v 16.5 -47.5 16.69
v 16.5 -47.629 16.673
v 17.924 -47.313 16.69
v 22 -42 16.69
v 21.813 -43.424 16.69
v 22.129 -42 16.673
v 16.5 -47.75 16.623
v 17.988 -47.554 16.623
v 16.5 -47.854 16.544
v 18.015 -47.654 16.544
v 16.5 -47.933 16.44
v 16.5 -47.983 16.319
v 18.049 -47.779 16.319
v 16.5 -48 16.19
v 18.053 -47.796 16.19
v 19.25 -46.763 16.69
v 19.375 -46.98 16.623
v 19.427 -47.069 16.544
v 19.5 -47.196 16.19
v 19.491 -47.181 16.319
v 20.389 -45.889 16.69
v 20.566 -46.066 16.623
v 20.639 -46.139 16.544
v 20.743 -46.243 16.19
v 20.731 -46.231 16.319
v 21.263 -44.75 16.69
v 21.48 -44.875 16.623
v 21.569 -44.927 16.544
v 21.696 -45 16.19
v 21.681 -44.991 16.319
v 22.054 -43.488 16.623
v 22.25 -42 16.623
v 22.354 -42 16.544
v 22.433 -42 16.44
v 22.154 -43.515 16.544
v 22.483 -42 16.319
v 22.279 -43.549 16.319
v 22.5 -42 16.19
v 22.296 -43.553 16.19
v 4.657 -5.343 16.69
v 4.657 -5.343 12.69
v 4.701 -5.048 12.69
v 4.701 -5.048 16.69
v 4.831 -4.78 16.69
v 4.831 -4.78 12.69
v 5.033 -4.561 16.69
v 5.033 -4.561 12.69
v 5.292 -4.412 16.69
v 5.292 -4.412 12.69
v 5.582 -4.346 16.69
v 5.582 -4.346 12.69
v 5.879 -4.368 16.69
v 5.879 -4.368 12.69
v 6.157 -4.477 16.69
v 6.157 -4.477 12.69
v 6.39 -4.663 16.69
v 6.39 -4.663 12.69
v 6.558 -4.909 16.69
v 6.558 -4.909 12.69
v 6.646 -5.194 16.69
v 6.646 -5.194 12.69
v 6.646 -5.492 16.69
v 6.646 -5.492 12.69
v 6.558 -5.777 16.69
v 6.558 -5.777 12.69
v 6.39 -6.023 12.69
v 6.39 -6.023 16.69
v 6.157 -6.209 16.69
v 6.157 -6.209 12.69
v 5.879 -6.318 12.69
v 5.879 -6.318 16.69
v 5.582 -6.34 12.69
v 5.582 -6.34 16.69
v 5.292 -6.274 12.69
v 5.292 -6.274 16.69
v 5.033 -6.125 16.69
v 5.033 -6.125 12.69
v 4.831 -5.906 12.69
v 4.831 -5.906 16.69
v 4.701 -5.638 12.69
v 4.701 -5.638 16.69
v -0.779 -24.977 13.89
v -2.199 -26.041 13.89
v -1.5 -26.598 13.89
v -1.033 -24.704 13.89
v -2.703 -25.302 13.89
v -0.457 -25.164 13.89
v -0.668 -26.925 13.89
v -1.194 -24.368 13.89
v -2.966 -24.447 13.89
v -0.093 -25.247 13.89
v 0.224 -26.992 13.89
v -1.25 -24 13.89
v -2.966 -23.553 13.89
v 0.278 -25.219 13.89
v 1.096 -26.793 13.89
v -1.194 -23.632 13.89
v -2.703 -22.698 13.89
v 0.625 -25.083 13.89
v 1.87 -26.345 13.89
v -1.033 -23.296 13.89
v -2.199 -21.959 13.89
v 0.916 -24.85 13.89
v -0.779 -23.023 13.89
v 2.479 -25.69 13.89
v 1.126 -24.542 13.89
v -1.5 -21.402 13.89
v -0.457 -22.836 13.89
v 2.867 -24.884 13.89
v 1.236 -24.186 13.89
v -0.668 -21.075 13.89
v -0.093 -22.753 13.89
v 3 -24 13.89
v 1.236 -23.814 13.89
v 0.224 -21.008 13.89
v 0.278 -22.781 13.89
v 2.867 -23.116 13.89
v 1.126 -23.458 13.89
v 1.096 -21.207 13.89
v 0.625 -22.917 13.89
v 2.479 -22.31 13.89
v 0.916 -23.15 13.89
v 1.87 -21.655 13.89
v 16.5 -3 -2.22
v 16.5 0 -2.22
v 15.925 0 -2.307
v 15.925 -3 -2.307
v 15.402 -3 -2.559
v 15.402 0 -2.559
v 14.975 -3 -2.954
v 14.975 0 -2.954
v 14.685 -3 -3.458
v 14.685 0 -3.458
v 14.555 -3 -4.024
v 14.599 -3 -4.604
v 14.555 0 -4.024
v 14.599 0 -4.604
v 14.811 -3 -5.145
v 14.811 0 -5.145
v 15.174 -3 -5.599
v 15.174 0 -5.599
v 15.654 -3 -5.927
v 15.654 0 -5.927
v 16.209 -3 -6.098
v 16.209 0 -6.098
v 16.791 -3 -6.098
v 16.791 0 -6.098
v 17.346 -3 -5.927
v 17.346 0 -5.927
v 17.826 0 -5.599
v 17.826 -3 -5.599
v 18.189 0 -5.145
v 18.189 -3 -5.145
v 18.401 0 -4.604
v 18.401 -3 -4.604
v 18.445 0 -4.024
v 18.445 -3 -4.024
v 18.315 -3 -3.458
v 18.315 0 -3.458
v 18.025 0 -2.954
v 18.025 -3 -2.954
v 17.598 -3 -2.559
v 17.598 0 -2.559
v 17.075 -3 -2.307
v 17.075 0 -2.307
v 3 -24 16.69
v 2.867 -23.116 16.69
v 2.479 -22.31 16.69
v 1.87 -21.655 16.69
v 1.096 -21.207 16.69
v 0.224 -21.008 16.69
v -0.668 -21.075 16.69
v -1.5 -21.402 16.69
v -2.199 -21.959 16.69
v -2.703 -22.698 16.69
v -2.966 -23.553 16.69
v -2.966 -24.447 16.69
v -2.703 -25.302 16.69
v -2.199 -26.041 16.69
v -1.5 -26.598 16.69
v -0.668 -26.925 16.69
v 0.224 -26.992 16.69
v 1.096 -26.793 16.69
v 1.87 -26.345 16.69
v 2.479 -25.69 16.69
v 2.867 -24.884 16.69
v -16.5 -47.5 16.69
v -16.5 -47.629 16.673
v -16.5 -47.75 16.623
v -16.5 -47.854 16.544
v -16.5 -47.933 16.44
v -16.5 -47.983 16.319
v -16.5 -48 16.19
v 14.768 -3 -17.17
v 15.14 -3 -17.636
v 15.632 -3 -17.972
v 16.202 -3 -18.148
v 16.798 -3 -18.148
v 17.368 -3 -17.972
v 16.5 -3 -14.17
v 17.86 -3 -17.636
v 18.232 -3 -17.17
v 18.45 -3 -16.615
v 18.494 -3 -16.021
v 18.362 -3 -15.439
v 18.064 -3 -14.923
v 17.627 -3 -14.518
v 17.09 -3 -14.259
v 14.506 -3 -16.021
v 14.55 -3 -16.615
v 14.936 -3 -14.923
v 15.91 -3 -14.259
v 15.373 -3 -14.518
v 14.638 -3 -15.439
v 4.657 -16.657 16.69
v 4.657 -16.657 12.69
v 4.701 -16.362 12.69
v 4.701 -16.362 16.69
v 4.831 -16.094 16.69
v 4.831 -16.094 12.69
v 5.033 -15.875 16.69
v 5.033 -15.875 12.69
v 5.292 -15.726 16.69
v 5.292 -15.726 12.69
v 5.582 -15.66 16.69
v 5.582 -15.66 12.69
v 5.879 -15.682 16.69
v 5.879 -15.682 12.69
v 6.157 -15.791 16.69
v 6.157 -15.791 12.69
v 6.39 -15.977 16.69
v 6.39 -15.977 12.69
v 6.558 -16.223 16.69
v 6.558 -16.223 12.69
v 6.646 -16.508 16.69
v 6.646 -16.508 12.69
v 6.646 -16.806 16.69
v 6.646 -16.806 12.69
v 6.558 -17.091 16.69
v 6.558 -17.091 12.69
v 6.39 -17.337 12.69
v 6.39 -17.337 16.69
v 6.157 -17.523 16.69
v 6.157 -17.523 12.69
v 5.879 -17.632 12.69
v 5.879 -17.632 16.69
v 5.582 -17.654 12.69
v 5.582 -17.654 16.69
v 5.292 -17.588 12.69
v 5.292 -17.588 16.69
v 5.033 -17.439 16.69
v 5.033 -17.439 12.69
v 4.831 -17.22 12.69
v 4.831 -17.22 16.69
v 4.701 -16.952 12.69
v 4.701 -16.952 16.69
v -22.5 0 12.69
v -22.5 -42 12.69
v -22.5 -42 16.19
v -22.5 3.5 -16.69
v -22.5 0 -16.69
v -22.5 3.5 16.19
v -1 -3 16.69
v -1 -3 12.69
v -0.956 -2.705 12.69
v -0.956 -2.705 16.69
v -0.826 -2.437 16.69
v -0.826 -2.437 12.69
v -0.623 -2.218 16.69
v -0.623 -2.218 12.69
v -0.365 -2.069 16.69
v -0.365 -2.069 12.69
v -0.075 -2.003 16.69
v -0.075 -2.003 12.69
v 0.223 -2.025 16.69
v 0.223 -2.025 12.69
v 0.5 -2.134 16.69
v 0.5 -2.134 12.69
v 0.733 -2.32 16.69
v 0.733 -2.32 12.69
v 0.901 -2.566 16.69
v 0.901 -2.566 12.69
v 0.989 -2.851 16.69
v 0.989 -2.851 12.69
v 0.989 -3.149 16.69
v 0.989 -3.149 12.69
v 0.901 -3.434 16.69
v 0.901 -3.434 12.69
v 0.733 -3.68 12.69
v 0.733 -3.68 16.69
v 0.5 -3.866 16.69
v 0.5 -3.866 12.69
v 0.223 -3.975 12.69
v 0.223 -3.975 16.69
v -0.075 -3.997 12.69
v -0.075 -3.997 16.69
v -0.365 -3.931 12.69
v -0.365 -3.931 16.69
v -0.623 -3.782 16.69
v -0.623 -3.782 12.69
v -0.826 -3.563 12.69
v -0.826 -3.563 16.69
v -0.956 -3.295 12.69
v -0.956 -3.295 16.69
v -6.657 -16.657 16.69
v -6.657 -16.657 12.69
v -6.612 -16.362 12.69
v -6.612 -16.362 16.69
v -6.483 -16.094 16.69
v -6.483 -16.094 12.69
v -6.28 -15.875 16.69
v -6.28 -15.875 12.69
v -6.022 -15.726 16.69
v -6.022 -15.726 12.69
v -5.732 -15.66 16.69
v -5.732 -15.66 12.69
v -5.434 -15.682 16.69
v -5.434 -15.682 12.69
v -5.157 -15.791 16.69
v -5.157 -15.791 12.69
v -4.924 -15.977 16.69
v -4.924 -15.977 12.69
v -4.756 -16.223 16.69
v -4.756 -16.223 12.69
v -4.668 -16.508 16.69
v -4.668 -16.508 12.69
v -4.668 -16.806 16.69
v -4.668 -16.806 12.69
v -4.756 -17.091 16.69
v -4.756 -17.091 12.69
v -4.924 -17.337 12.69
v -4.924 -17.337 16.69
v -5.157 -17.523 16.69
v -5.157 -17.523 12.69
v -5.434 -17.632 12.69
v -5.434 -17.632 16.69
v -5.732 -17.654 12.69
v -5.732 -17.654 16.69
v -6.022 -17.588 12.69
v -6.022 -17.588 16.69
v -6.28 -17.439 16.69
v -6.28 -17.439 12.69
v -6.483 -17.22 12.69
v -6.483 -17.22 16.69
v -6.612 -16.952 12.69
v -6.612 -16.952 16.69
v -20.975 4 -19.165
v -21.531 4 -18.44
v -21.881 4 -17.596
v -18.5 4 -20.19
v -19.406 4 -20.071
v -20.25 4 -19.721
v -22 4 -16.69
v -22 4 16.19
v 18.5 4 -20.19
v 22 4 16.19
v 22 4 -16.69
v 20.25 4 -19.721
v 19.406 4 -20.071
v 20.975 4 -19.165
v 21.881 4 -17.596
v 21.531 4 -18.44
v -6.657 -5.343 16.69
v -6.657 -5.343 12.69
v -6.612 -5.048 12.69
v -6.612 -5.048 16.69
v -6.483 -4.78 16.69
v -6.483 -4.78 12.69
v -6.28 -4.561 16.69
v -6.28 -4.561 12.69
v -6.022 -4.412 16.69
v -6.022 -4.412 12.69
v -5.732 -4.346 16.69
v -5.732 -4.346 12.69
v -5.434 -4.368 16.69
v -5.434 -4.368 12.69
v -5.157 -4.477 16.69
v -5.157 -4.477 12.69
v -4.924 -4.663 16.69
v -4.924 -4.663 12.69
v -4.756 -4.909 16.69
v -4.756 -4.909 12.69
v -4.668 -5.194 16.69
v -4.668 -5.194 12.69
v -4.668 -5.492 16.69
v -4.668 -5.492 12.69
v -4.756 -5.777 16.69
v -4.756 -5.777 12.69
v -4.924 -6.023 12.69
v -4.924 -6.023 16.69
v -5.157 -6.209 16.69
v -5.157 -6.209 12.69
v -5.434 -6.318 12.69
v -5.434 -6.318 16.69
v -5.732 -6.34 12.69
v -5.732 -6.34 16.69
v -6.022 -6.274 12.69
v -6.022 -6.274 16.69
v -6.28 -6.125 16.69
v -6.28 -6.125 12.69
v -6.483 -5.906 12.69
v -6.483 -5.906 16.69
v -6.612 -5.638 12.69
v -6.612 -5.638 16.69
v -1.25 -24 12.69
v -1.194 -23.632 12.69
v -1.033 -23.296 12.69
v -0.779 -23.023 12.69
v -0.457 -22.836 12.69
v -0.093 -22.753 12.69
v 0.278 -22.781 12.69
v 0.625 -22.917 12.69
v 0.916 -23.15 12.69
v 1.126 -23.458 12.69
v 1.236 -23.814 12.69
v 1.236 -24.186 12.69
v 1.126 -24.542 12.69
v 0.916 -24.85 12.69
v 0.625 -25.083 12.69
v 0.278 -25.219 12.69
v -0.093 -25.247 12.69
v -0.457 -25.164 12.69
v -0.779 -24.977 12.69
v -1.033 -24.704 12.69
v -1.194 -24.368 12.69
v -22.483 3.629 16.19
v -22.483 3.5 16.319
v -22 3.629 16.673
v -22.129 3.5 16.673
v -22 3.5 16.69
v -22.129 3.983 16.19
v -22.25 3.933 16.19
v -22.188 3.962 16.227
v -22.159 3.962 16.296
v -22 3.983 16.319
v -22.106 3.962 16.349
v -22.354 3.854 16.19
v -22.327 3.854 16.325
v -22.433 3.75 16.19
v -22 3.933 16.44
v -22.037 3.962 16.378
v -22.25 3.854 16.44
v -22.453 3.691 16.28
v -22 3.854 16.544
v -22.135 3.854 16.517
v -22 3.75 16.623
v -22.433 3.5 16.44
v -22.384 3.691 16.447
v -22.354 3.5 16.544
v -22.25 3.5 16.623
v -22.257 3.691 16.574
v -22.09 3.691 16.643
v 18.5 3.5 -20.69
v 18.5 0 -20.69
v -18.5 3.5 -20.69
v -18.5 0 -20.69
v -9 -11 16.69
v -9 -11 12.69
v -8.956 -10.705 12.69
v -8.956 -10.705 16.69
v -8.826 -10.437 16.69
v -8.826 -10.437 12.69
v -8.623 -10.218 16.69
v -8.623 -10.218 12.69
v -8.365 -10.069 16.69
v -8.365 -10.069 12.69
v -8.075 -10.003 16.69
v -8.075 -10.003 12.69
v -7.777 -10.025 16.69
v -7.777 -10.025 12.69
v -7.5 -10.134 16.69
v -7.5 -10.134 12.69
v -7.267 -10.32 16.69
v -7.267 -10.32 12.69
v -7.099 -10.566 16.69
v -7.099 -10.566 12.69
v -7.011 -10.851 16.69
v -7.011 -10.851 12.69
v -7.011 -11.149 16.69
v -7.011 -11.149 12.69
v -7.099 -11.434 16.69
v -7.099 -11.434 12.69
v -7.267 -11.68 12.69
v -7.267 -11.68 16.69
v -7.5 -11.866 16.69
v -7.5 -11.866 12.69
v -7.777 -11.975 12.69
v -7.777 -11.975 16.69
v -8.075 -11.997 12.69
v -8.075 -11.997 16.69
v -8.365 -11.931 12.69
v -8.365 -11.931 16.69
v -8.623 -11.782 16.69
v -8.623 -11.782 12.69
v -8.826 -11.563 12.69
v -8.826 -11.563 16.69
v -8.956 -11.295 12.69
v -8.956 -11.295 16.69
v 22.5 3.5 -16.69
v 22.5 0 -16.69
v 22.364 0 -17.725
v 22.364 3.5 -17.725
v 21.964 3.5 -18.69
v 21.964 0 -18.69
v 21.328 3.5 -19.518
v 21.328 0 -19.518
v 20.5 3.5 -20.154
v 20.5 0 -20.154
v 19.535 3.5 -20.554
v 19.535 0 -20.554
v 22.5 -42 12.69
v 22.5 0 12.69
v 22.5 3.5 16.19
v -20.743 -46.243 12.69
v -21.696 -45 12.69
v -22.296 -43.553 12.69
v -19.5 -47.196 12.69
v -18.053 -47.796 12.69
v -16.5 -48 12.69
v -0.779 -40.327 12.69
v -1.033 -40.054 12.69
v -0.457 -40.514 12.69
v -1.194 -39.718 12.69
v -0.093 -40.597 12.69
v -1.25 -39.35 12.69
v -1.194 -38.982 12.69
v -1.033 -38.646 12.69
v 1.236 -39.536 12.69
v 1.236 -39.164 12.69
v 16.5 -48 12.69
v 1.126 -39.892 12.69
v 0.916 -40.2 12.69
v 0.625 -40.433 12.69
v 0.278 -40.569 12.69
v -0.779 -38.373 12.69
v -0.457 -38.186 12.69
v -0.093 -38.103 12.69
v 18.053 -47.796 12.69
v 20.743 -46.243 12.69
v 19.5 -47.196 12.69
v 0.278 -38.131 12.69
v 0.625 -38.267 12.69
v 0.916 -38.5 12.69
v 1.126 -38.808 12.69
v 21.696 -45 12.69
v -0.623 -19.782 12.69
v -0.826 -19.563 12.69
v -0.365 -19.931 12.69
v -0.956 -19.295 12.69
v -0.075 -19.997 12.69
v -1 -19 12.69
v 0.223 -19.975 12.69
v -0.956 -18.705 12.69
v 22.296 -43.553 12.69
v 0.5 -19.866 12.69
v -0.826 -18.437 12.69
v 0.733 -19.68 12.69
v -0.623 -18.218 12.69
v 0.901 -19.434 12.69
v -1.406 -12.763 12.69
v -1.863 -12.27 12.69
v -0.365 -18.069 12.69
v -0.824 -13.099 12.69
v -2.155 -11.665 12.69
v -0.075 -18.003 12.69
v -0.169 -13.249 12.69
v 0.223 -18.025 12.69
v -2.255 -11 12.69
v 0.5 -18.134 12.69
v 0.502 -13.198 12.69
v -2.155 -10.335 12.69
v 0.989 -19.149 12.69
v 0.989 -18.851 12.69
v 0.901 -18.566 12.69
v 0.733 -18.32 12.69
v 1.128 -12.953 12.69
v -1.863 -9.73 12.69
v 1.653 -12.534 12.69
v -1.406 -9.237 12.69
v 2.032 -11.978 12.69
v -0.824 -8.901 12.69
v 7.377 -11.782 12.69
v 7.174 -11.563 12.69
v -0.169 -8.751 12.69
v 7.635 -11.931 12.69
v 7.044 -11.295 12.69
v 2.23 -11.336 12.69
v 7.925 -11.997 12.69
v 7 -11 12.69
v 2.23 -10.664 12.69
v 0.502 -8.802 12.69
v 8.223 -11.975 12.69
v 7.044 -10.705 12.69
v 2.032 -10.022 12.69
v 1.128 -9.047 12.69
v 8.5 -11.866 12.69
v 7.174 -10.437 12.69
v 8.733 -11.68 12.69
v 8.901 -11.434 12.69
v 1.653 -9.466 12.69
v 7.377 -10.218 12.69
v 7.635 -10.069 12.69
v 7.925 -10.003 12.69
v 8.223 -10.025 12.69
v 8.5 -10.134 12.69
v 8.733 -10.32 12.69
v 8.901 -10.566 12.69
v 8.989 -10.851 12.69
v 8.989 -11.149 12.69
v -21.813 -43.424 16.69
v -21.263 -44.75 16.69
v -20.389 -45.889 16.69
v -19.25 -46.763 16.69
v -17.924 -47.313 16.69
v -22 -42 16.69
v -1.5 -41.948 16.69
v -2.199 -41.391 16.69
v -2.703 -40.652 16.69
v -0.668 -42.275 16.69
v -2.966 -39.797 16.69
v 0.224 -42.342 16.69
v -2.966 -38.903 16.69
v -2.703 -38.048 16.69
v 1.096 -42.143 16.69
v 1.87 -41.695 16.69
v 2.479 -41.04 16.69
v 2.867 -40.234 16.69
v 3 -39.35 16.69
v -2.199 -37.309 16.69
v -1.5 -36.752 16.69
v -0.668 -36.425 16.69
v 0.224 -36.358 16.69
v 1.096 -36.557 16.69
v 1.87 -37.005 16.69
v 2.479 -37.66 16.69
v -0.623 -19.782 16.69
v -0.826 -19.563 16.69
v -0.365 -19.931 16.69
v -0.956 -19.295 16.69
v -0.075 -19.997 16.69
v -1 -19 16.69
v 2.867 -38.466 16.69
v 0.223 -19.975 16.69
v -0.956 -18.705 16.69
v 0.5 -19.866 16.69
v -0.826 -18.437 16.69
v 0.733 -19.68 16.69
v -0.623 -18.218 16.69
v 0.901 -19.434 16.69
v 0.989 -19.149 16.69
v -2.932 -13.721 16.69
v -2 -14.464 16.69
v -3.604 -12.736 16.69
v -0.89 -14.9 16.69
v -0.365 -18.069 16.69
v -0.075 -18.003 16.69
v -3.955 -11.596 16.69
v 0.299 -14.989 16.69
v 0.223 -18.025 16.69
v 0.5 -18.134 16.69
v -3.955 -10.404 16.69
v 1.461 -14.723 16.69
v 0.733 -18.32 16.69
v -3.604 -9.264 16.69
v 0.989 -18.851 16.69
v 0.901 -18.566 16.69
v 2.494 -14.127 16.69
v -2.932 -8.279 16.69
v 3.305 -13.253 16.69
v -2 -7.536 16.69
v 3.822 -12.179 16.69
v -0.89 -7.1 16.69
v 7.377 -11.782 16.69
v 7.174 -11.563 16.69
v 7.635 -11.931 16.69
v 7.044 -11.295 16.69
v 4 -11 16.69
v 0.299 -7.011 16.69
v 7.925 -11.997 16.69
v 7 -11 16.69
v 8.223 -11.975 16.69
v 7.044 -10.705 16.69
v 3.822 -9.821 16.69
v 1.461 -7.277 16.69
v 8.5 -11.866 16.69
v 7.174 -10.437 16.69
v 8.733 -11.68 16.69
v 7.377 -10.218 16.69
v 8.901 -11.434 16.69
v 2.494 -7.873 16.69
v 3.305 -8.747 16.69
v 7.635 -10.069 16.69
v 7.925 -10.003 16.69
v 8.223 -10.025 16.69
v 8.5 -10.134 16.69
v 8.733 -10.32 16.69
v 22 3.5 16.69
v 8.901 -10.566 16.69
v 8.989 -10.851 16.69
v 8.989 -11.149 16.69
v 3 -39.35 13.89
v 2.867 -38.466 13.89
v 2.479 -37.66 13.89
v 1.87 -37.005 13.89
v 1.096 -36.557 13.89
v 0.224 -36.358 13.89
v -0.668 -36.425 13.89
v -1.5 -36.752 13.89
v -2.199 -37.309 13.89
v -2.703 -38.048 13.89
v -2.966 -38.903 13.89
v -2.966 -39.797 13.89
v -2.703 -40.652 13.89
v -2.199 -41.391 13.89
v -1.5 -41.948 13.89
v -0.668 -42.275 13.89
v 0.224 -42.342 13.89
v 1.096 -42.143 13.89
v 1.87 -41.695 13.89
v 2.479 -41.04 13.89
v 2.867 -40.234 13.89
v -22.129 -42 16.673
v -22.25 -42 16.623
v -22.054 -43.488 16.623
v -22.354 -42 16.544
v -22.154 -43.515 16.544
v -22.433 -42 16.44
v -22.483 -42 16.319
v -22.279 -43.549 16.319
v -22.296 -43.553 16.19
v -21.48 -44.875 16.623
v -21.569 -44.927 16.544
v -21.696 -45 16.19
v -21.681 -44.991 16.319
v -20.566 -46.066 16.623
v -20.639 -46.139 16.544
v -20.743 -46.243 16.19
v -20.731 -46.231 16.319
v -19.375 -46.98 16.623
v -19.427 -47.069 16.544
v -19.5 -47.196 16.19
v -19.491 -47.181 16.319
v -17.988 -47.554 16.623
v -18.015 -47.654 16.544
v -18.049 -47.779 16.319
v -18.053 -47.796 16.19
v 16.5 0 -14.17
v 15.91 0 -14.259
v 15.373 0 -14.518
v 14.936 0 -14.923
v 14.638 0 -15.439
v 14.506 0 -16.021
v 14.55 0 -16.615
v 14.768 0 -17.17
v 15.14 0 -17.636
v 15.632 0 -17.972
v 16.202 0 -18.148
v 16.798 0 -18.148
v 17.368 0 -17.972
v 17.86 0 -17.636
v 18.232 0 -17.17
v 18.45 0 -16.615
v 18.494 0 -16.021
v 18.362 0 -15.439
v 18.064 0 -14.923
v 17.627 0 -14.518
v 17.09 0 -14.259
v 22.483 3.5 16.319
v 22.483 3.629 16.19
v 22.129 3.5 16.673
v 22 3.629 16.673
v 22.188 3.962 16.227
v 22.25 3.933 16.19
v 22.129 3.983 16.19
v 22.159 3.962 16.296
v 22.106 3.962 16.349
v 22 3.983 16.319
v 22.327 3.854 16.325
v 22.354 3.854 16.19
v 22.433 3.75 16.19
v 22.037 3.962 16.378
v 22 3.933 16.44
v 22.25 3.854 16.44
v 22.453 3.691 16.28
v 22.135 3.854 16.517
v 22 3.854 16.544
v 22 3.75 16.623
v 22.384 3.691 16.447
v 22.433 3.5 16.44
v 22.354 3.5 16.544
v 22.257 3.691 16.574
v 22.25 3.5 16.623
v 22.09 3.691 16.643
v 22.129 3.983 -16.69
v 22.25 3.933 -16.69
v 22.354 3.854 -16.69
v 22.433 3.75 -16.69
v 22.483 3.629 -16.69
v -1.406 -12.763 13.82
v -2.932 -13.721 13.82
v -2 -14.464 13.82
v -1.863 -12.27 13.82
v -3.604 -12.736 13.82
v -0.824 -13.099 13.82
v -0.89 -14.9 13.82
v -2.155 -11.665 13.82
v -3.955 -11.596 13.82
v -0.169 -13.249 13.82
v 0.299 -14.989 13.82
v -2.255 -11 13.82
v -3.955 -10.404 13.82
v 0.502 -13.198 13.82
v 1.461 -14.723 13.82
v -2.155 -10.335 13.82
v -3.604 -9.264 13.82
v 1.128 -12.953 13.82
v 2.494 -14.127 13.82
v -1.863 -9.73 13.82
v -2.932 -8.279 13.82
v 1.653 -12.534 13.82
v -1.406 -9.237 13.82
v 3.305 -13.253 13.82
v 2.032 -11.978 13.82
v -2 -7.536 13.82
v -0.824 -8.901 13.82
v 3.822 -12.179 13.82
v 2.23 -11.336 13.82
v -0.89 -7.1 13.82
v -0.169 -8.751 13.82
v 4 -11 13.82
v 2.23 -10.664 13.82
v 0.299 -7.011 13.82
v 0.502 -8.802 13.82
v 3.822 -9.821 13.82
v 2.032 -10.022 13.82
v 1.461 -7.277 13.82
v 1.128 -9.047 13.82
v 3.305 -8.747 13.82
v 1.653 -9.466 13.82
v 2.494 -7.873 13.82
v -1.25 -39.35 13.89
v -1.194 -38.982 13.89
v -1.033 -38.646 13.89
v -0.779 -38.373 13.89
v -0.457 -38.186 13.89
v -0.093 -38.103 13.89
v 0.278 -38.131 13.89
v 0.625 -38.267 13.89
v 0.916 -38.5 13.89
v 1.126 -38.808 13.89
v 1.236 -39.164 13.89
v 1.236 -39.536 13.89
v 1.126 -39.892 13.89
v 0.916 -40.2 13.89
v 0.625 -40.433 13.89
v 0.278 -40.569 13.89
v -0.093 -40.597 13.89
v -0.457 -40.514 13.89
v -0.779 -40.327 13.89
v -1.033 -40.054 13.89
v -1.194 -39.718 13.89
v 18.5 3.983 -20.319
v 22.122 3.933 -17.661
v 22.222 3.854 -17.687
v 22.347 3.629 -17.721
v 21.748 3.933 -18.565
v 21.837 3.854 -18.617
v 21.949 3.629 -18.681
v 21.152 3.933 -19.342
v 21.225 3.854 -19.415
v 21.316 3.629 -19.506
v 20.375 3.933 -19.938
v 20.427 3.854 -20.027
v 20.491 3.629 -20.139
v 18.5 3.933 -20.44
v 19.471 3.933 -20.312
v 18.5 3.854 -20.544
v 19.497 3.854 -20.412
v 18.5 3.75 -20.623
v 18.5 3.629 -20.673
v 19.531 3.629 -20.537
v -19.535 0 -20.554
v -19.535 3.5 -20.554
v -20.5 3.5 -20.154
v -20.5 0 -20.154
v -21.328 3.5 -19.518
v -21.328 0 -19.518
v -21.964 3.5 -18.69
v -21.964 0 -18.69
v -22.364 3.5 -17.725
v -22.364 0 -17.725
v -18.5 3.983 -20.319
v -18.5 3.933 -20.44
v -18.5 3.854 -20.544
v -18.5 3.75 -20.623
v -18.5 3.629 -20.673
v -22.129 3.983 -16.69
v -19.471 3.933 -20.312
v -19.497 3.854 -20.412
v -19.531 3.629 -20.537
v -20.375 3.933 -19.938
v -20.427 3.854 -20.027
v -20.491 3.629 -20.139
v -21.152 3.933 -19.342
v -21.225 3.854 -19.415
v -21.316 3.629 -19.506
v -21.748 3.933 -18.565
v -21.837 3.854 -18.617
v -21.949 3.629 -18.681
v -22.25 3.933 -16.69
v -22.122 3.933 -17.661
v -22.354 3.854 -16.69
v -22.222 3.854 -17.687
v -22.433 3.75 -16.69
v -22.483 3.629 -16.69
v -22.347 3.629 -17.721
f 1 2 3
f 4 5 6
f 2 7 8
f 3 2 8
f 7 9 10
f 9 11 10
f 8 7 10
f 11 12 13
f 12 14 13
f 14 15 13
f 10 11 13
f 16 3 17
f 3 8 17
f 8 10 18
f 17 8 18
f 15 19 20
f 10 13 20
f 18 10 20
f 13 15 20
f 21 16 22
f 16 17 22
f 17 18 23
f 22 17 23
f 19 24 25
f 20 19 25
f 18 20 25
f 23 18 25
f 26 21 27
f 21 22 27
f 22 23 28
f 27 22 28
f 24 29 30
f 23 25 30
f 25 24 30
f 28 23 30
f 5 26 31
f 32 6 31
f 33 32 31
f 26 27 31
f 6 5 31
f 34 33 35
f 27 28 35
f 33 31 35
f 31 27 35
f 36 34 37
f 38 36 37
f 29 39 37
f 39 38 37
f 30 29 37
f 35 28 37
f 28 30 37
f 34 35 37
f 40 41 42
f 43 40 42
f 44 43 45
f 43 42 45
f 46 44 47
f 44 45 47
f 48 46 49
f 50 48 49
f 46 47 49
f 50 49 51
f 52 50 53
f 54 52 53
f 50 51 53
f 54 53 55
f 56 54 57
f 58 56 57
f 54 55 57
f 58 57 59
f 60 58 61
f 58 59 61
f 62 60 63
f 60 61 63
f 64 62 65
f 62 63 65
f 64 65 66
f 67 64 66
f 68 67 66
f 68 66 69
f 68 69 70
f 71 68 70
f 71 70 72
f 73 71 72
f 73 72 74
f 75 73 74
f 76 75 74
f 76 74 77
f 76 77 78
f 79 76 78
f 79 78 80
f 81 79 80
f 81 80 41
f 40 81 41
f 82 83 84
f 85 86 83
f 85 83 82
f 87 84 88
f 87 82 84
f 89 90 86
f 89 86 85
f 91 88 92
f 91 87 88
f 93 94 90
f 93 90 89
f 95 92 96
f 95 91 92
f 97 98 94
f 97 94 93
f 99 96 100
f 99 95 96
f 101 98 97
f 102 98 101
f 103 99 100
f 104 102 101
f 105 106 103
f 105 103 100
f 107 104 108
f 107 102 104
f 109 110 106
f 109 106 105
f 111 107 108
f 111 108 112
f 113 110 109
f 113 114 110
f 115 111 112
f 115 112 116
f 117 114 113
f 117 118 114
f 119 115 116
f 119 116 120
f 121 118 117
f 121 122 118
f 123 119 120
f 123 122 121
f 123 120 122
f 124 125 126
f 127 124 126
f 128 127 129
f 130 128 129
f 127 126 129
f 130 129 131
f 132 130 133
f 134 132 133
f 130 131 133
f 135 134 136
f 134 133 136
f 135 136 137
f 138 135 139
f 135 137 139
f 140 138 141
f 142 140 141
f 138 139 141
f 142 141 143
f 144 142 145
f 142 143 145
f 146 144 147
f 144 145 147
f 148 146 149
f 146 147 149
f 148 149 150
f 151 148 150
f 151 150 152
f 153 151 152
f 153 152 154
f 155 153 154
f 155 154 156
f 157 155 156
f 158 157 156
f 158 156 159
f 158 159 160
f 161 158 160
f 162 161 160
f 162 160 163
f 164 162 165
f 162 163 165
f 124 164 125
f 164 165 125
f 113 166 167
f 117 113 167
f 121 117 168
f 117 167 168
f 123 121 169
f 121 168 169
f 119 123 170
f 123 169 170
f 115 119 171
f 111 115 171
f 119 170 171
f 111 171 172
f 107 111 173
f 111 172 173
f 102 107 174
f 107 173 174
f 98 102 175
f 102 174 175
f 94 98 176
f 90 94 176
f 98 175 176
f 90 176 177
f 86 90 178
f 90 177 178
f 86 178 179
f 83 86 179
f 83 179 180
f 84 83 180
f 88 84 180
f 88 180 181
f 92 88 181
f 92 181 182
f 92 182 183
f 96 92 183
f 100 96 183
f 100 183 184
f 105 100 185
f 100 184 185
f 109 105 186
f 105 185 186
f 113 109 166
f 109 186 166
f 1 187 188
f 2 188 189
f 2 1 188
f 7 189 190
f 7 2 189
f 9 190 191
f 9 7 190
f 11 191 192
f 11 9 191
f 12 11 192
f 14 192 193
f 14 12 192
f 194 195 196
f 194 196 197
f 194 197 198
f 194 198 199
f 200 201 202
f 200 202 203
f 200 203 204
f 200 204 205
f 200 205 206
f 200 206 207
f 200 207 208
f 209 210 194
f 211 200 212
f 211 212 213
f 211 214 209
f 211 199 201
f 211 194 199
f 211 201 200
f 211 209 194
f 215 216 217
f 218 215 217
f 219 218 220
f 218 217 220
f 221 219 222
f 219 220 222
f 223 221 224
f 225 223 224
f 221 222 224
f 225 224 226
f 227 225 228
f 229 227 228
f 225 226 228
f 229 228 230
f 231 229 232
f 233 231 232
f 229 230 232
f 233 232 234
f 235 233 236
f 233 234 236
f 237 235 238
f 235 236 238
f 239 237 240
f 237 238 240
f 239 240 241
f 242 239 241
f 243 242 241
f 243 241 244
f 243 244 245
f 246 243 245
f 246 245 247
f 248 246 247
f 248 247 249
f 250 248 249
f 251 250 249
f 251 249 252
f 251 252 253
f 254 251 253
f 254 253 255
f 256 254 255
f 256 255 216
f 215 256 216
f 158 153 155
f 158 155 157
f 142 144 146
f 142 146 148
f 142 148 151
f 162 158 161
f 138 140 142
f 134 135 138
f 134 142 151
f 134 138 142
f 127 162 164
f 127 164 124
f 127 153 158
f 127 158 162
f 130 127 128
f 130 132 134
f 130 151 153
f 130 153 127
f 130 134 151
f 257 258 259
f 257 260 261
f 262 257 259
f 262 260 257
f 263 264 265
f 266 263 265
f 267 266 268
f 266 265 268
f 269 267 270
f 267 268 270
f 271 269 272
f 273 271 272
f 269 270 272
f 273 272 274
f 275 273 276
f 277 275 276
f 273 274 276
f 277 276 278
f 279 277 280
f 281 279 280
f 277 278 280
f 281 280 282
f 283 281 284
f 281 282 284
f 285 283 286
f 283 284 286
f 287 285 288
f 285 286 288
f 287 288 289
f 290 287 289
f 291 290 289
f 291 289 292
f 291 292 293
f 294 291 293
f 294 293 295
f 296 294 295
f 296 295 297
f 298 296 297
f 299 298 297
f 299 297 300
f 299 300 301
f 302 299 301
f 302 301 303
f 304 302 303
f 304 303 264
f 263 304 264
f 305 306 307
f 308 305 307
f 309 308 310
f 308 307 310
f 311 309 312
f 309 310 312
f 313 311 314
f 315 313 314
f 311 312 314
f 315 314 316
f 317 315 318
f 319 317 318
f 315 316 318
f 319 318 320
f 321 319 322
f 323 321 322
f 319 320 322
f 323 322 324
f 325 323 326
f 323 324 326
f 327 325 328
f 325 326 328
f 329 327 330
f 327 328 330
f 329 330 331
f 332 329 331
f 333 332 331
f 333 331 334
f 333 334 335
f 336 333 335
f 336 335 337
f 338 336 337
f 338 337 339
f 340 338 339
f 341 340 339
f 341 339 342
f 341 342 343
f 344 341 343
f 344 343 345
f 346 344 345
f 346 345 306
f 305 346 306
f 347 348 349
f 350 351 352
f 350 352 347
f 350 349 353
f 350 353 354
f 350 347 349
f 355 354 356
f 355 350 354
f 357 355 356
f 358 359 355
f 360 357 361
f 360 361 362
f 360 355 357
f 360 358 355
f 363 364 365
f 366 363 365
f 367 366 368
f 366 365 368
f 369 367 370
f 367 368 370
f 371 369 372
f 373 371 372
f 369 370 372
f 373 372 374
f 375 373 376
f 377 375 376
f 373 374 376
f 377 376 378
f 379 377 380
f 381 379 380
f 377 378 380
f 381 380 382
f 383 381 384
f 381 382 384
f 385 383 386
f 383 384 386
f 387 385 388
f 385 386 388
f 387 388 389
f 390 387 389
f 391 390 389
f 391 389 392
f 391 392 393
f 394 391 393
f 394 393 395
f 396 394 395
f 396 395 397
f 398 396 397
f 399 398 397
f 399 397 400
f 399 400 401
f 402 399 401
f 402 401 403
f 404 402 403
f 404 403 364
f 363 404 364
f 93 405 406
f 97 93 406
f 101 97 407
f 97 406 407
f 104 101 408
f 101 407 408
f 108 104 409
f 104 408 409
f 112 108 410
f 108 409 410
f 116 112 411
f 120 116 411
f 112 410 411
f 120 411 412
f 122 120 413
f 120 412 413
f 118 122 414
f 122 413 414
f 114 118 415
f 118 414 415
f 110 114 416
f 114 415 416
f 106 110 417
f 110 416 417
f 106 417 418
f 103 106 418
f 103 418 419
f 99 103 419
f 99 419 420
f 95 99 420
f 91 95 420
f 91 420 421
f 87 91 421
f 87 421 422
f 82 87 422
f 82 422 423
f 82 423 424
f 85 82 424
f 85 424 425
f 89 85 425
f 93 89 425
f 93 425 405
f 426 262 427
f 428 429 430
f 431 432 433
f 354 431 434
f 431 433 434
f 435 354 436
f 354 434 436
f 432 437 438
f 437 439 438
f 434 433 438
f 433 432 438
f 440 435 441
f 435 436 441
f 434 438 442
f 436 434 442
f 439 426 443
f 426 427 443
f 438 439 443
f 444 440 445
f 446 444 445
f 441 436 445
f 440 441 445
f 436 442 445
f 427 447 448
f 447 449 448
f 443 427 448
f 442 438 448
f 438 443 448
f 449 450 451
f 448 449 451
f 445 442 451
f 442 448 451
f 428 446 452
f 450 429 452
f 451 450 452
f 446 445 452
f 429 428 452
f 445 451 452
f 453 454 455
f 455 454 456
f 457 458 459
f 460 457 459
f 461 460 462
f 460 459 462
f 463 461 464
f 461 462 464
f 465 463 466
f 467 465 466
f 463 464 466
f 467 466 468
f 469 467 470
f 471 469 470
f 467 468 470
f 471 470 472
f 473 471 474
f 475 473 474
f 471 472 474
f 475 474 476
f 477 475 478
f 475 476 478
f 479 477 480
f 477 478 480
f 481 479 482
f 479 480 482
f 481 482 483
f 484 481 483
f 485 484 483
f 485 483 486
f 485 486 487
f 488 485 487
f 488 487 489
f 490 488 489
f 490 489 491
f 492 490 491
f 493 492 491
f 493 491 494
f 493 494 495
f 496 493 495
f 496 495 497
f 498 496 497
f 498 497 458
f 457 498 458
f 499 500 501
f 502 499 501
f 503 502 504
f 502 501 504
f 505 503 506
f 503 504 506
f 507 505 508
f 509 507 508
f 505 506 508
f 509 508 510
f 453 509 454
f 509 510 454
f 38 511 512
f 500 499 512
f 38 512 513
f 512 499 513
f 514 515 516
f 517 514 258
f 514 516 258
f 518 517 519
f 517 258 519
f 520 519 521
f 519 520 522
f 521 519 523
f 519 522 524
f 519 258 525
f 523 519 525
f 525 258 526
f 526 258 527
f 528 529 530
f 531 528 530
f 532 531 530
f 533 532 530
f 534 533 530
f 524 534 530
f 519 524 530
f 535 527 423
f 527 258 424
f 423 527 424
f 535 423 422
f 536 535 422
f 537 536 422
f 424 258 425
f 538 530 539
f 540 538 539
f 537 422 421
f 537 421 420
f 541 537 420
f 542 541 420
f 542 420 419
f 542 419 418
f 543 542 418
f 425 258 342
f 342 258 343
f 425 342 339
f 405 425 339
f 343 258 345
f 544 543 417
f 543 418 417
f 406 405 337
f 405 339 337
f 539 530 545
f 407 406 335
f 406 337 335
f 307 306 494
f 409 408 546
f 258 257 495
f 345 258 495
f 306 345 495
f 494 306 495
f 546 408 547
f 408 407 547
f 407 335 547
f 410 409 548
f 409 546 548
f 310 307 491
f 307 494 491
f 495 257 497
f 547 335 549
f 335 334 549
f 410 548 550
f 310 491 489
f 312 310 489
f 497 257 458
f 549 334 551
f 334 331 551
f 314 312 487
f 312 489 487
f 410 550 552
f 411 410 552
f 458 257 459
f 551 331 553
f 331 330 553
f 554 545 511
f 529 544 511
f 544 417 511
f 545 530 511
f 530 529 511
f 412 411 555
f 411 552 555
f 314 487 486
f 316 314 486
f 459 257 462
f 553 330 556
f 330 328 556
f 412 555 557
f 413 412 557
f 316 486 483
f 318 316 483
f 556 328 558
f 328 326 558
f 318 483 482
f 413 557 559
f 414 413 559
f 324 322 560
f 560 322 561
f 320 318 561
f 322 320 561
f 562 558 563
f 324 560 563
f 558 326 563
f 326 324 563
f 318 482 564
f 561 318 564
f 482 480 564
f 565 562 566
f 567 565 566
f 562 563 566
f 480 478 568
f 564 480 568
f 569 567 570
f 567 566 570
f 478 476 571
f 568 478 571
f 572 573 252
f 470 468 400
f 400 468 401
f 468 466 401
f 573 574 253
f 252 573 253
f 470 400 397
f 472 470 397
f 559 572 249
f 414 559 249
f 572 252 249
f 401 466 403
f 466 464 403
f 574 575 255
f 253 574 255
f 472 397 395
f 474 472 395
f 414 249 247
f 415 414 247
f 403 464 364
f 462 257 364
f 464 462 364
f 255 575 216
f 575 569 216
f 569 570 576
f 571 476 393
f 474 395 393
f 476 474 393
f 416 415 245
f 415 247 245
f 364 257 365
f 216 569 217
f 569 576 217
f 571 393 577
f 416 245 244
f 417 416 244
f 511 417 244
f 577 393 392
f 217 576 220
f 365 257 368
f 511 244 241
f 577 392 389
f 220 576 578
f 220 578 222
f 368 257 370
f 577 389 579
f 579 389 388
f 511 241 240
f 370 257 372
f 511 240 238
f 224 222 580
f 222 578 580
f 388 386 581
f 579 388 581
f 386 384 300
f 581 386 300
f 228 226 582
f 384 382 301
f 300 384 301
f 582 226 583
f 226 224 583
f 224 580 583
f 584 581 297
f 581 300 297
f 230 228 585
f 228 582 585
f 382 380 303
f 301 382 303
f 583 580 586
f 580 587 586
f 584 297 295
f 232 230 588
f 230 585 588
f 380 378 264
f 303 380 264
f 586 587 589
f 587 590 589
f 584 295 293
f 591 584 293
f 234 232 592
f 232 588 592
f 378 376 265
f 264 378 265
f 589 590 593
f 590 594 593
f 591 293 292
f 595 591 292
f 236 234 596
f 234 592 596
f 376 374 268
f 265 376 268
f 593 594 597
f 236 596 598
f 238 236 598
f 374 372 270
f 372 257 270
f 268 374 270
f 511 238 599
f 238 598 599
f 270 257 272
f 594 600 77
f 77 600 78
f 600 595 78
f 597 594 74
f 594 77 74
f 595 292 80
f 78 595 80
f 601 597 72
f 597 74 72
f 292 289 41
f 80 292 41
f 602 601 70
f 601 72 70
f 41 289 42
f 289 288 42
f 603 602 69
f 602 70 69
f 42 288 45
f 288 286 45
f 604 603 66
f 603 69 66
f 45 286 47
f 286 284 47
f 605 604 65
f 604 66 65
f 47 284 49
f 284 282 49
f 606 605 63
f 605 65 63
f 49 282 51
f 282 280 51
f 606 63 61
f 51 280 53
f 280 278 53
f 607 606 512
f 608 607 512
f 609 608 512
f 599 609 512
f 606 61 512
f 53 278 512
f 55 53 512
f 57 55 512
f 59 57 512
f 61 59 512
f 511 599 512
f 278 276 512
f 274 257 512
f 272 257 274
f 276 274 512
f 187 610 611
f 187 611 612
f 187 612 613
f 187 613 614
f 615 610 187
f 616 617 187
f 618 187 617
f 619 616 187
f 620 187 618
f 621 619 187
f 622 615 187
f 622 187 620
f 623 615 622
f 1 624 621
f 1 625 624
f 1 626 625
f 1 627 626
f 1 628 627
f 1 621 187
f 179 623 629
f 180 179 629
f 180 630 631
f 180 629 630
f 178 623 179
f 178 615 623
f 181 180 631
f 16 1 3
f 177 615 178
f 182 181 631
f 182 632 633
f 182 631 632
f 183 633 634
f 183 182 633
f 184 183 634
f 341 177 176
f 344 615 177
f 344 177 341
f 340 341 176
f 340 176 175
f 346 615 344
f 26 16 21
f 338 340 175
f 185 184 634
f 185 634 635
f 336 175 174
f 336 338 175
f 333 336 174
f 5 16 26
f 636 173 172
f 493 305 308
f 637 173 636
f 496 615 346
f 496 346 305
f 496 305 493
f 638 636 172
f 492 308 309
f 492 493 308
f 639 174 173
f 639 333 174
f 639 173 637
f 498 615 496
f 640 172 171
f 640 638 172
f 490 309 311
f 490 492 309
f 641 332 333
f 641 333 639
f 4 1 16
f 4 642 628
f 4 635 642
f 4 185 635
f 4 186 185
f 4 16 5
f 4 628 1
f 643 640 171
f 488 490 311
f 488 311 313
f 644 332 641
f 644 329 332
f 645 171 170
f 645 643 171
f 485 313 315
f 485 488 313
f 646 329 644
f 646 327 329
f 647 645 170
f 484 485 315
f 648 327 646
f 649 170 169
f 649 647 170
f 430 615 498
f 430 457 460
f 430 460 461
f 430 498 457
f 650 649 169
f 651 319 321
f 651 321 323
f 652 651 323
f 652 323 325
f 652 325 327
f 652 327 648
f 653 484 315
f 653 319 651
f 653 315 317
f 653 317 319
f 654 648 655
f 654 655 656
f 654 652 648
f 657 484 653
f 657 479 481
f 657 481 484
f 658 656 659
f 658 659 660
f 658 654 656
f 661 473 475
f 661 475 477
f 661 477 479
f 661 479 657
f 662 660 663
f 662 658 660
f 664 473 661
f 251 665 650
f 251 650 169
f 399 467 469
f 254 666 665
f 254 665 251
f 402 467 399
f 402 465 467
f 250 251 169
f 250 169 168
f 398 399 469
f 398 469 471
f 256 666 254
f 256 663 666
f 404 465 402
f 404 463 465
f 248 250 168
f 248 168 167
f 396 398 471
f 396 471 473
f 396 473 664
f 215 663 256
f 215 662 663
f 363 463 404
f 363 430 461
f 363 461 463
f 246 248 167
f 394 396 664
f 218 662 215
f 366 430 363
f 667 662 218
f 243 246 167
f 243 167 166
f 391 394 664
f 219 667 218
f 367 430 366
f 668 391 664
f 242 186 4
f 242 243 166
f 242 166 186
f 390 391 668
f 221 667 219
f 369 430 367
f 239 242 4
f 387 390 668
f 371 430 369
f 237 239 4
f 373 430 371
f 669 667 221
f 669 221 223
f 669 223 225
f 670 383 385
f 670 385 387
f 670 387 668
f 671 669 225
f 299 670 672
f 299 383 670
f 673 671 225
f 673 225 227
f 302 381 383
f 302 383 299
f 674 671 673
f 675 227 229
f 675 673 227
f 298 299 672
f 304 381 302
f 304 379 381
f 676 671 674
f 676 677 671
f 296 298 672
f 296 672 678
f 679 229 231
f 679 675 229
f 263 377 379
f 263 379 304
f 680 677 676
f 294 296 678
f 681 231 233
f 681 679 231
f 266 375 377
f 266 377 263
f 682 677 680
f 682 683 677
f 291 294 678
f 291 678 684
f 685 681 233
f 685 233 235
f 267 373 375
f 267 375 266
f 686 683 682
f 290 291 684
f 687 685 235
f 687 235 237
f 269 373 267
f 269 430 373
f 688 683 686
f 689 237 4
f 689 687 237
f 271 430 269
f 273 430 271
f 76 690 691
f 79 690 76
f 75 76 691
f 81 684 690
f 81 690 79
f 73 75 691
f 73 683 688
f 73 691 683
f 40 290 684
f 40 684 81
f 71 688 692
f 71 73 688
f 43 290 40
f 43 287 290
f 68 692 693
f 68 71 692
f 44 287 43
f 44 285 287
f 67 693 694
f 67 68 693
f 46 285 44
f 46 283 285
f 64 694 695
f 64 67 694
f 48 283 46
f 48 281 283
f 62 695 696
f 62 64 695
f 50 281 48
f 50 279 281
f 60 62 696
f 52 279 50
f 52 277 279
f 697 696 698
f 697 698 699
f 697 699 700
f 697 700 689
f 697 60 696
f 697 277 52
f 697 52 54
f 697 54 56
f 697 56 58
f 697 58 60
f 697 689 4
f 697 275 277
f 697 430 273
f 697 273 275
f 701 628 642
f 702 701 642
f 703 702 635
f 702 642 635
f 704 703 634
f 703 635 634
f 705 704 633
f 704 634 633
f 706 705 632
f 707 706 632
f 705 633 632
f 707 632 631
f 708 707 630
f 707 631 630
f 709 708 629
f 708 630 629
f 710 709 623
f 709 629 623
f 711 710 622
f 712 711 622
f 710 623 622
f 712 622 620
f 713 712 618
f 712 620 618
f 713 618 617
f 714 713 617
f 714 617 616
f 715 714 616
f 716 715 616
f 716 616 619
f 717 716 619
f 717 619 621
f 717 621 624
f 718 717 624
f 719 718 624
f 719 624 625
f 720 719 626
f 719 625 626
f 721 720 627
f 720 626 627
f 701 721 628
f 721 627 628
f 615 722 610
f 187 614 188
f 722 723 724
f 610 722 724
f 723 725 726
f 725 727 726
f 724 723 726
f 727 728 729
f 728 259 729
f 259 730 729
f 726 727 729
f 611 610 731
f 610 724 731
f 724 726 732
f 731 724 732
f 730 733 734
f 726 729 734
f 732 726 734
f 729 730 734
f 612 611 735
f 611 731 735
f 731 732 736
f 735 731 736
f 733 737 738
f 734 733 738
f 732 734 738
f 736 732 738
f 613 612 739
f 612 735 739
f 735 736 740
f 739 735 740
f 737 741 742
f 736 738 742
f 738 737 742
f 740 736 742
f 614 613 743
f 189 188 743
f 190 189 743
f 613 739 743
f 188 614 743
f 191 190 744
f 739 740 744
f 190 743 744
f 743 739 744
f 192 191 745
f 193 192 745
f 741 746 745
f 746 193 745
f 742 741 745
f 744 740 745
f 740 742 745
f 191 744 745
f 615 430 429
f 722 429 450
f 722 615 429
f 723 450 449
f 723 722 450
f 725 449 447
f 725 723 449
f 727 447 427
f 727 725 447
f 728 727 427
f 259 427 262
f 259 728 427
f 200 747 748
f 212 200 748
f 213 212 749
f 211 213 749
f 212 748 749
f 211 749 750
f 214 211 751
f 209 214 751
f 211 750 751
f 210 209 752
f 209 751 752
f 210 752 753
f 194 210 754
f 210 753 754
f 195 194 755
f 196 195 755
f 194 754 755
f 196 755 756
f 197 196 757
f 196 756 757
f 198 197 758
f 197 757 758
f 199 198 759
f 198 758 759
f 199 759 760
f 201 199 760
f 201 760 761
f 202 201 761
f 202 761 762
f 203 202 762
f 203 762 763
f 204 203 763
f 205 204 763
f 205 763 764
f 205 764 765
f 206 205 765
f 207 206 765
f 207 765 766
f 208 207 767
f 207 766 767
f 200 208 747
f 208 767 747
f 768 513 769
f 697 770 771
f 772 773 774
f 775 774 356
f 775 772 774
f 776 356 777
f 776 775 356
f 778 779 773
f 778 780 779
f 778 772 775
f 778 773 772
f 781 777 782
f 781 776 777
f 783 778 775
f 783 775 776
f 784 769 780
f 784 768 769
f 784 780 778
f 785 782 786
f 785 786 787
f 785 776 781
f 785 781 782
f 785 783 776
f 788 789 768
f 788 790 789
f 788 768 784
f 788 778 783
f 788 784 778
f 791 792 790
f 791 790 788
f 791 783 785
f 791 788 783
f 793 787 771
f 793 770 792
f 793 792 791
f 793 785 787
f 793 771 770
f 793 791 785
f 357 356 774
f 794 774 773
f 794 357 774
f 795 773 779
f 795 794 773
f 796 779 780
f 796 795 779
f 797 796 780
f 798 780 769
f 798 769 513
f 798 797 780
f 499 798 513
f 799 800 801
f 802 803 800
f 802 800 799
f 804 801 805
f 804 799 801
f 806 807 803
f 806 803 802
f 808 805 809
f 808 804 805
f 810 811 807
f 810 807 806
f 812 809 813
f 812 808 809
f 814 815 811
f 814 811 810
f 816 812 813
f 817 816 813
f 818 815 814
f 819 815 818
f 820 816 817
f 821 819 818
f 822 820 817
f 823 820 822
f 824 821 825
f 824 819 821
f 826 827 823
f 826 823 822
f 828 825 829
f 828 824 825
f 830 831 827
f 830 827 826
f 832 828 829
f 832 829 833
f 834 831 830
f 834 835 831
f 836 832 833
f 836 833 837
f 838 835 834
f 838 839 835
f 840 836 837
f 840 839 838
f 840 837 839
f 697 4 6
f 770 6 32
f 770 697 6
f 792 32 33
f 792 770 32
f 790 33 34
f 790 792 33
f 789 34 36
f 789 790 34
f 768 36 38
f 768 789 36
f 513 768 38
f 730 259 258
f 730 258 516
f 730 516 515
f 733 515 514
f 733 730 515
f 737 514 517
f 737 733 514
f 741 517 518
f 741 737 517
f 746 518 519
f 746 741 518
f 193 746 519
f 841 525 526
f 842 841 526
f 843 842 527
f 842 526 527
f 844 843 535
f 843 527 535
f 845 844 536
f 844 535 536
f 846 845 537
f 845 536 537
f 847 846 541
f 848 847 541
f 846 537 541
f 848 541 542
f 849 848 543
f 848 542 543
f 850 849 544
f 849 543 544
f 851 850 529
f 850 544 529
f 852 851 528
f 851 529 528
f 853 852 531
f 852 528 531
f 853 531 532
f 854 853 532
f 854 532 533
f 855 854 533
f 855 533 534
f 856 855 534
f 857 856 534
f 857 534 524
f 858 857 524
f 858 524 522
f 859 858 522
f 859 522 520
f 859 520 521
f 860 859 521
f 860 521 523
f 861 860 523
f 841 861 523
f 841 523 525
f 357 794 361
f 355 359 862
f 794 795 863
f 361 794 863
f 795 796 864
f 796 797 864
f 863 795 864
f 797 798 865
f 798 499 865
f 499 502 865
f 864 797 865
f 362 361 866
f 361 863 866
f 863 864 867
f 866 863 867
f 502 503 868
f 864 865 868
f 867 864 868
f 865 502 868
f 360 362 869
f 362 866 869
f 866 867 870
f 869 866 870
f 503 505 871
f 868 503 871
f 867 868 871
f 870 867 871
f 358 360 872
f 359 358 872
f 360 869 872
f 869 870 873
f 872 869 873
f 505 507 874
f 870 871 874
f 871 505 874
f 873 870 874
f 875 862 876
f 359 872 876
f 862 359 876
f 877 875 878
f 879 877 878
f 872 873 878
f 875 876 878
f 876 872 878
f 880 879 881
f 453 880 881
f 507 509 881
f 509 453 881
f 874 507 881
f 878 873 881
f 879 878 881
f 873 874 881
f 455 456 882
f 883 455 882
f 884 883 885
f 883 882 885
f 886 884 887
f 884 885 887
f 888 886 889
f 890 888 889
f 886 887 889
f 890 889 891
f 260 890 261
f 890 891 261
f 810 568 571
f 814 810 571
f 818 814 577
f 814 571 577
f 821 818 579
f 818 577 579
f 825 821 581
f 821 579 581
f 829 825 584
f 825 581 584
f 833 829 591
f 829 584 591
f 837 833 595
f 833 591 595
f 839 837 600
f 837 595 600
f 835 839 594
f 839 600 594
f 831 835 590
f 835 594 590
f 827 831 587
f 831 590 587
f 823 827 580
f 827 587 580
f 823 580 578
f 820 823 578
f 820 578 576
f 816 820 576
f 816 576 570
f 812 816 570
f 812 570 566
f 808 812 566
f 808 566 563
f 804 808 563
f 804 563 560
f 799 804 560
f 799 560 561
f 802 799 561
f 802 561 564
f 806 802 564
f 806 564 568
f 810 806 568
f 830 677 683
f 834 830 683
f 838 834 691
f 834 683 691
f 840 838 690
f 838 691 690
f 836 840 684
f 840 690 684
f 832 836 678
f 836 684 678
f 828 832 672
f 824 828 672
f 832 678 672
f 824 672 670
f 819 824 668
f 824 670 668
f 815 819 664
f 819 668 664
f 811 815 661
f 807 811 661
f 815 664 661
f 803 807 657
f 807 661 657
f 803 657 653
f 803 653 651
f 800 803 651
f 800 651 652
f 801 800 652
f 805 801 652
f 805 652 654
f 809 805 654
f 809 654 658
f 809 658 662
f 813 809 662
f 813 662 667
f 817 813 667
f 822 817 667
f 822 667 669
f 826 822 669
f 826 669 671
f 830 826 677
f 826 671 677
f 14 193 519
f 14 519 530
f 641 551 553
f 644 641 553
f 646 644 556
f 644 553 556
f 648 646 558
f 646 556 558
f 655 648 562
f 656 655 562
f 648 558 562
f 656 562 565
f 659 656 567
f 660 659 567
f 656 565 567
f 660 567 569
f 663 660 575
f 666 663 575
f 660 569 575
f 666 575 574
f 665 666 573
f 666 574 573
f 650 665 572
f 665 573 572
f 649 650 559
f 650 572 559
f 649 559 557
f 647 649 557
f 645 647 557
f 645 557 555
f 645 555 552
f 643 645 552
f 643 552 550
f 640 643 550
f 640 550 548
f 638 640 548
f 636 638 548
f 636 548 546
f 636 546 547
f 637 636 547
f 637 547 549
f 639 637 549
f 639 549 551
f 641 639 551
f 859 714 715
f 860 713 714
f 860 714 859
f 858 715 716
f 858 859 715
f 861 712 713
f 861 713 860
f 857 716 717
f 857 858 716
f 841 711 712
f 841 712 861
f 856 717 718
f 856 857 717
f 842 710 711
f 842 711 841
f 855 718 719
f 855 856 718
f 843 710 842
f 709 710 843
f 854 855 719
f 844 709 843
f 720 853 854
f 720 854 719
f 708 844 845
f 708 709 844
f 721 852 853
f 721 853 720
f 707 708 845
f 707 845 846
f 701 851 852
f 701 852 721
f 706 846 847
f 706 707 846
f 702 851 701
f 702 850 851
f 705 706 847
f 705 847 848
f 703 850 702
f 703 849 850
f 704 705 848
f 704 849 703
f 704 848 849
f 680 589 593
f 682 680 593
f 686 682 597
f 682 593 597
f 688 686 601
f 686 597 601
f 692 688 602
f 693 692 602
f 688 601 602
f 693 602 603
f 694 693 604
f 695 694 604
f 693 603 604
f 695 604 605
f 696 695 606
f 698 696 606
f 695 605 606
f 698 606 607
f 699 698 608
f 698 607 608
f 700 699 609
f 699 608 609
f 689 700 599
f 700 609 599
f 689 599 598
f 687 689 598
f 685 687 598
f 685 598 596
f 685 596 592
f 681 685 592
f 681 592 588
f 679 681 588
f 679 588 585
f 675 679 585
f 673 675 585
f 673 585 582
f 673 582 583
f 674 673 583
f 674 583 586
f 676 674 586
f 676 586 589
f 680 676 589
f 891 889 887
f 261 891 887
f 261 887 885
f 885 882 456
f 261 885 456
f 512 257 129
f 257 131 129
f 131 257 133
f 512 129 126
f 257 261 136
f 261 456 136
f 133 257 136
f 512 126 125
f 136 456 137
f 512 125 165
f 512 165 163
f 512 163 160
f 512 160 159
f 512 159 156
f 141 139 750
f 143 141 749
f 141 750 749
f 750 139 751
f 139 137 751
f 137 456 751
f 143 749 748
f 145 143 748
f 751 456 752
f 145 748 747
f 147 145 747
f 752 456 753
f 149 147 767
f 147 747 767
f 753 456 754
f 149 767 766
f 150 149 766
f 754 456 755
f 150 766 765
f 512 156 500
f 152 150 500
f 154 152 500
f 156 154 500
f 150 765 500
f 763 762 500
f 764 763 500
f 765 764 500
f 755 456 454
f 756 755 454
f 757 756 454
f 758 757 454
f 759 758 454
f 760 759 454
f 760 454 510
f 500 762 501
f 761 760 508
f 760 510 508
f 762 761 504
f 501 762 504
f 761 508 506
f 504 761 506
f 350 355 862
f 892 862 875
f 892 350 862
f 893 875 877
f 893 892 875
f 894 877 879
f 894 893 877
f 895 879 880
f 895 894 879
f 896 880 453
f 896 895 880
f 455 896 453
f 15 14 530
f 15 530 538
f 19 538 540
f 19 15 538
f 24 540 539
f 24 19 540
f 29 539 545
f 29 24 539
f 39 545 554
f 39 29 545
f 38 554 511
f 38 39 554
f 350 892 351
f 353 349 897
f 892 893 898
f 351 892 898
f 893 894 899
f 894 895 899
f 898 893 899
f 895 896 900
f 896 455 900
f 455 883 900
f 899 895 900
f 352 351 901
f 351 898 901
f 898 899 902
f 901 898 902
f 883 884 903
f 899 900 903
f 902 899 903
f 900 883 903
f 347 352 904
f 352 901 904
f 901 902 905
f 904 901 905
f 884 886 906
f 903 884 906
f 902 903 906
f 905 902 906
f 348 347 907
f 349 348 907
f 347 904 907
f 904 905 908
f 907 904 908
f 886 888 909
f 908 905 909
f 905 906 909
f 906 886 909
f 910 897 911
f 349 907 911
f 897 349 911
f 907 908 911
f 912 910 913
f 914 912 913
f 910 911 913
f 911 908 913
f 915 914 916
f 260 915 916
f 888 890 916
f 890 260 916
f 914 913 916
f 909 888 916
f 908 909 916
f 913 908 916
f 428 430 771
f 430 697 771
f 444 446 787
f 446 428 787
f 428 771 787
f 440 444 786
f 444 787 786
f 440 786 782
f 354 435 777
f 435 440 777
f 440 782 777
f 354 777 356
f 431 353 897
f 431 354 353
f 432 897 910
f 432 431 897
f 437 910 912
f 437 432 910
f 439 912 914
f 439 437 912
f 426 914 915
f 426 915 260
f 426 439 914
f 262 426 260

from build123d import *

# Parameters (mm, degrees)
BOSS_EXTRUDE1_DEPTH = 4
SKETCH2_W           = 45
SKETCH2_H           = 4
BOSS_EXTRUDE2_DEPTH = 48
SKETCH3_R           = 1.25
CUT_EXTRUDE1_DEPTH  = 63.645625546
FILLET1_R           = 6
FILLET2_R           = 0.5
SKETCH6_R           = 2.255
CUT_EXTRUDE2_DEPTH  = 63.645625582
SKETCH7_R           = 1
CUT_EXTRUDE3_DEPTH  = 63.645625582
SKETCH8_R           = 4
CUT_EXTRUDE4_DEPTH  = 2.87
SKETCH9_R           = 3
CUT_EXTRUDE5_DEPTH  = 2.8
SKETCH10_R          = 2
SKETCH10_R_2        = 1.95
BOSS_EXTRUDE3_DEPTH = 3


with BuildPart() as part:
    # Sketch1 → Boss-Extrude1 (new body)
    with BuildSketch(Plane(origin=(0, 0, 0), x_dir=(1, 0, 0), z_dir=(0, 1, 0))):
        with BuildLine():
            Line((-22.5, -16.69), (22.5, -16.69))
            Line((22.5, -16.69), (22.5, 16.69))
            ThreePointArc((22.5, 16.69), (21.328427125, 19.518427125), (18.5, 20.69))
            Line((18.5, 20.69), (-18.5, 20.69))
            ThreePointArc((-18.5, 20.69), (-21.328427125, 19.518427125), (-22.5, 16.69))
            Line((-22.5, 16.69), (-22.5, -16.69))
        make_face()
    extrude(amount=BOSS_EXTRUDE1_DEPTH)

    # Sketch2 → Boss-Extrude2 (add)
    with BuildSketch(Plane.XZ):
        with Locations((0, 14.69)):
            Rectangle(SKETCH2_W, SKETCH2_H)
    extrude(amount=BOSS_EXTRUDE2_DEPTH)

    # Sketch3 → Cut-Extrude1 (cut, through all)
    with BuildSketch(Plane(origin=(0, 0, 12.69), x_dir=(-1, 0, 0), z_dir=(0, 0, -1))):
        with Locations((0, -39.35)):
            Circle(SKETCH3_R)
        with Locations((0, -24)):
            Circle(SKETCH3_R)
    extrude(amount=-CUT_EXTRUDE1_DEPTH, mode=Mode.SUBTRACT)

    # Fillet1
    fillet1_edges = [part.edges().sort_by_distance(p)[0] for p in [
        (-22.5, -48, 14.69),
        (22.5, -48, 14.69),
    ]]
    fillet(fillet1_edges, radius=FILLET1_R)

    # Fillet2
    fillet2_edges = [part.edges().sort_by_distance(p)[0] for p in [
        (22.5, -19, 16.69),
        (-22.5, -19, 16.69),
        (22.5, 4, 0),
        (21.328427125, 4, -19.518427125),
        (0, 4, -20.69),
        (-21.328427125, 4, -19.518427125),
        (0, -48, 16.69),
        (-20.742640687, -46.242640687, 16.69),
        (20.742640687, -46.242640687, 16.69),
        (-22.5, 4, 0),
        (0, 4, 16.69),
    ]]
    fillet(fillet2_edges, radius=FILLET2_R)

    # Sketch6 → Cut-Extrude2 (cut, through all)
    with BuildSketch(Plane(origin=(0, 0, 12.69), x_dir=(-1, 0, 0), z_dir=(0, 0, -1))):
        with Locations((0, -11)):
            Circle(SKETCH6_R)
    extrude(amount=-CUT_EXTRUDE2_DEPTH, mode=Mode.SUBTRACT)

    # Sketch7 → Cut-Extrude3 (cut, through all)
    with BuildSketch(Plane(origin=(0, 0, 12.69), x_dir=(-1, 0, 0), z_dir=(0, 0, -1))):
        with Locations((0, -19)):
            Circle(SKETCH7_R)
        with Locations((-5.656854249, -16.656854249)):
            Circle(SKETCH7_R)
        with Locations((-8, -11)):
            Circle(SKETCH7_R)
        with Locations((-5.656854249, -5.343145751)):
            Circle(SKETCH7_R)
        with Locations((0, -3)):
            Circle(SKETCH7_R)
        with Locations((5.656854249, -5.343145751)):
            Circle(SKETCH7_R)
        with Locations((8, -11)):
            Circle(SKETCH7_R)
        with Locations((5.656854249, -16.656854249)):
            Circle(SKETCH7_R)
    extrude(amount=-CUT_EXTRUDE3_DEPTH, mode=Mode.SUBTRACT)

    # Sketch8 → Cut-Extrude4 (cut)
    with BuildSketch(Plane.XY.offset(16.69)):
        with Locations((0, -11)):
            Circle(SKETCH8_R)
    extrude(amount=-CUT_EXTRUDE4_DEPTH, mode=Mode.SUBTRACT)

    # Sketch9 → Cut-Extrude5 (cut)
    with BuildSketch(Plane.XY.offset(16.69)):
        with Locations((0, -24)):
            Circle(SKETCH9_R)
        with Locations((0, -39.35)):
            Circle(SKETCH9_R)
    extrude(amount=-CUT_EXTRUDE5_DEPTH, mode=Mode.SUBTRACT)

    # Sketch10 → Boss-Extrude3 (add)
    with BuildSketch(Plane.XZ):
        with Locations(Location((16.5, -16.17, 0), (0, 0, 90))):
            Circle(SKETCH10_R)
        with Locations(Location((16.5, -4.17, 0), (0, 0, 90))):
            Circle(SKETCH10_R_2)
    extrude(amount=BOSS_EXTRUDE3_DEPTH)


solid = part.part
